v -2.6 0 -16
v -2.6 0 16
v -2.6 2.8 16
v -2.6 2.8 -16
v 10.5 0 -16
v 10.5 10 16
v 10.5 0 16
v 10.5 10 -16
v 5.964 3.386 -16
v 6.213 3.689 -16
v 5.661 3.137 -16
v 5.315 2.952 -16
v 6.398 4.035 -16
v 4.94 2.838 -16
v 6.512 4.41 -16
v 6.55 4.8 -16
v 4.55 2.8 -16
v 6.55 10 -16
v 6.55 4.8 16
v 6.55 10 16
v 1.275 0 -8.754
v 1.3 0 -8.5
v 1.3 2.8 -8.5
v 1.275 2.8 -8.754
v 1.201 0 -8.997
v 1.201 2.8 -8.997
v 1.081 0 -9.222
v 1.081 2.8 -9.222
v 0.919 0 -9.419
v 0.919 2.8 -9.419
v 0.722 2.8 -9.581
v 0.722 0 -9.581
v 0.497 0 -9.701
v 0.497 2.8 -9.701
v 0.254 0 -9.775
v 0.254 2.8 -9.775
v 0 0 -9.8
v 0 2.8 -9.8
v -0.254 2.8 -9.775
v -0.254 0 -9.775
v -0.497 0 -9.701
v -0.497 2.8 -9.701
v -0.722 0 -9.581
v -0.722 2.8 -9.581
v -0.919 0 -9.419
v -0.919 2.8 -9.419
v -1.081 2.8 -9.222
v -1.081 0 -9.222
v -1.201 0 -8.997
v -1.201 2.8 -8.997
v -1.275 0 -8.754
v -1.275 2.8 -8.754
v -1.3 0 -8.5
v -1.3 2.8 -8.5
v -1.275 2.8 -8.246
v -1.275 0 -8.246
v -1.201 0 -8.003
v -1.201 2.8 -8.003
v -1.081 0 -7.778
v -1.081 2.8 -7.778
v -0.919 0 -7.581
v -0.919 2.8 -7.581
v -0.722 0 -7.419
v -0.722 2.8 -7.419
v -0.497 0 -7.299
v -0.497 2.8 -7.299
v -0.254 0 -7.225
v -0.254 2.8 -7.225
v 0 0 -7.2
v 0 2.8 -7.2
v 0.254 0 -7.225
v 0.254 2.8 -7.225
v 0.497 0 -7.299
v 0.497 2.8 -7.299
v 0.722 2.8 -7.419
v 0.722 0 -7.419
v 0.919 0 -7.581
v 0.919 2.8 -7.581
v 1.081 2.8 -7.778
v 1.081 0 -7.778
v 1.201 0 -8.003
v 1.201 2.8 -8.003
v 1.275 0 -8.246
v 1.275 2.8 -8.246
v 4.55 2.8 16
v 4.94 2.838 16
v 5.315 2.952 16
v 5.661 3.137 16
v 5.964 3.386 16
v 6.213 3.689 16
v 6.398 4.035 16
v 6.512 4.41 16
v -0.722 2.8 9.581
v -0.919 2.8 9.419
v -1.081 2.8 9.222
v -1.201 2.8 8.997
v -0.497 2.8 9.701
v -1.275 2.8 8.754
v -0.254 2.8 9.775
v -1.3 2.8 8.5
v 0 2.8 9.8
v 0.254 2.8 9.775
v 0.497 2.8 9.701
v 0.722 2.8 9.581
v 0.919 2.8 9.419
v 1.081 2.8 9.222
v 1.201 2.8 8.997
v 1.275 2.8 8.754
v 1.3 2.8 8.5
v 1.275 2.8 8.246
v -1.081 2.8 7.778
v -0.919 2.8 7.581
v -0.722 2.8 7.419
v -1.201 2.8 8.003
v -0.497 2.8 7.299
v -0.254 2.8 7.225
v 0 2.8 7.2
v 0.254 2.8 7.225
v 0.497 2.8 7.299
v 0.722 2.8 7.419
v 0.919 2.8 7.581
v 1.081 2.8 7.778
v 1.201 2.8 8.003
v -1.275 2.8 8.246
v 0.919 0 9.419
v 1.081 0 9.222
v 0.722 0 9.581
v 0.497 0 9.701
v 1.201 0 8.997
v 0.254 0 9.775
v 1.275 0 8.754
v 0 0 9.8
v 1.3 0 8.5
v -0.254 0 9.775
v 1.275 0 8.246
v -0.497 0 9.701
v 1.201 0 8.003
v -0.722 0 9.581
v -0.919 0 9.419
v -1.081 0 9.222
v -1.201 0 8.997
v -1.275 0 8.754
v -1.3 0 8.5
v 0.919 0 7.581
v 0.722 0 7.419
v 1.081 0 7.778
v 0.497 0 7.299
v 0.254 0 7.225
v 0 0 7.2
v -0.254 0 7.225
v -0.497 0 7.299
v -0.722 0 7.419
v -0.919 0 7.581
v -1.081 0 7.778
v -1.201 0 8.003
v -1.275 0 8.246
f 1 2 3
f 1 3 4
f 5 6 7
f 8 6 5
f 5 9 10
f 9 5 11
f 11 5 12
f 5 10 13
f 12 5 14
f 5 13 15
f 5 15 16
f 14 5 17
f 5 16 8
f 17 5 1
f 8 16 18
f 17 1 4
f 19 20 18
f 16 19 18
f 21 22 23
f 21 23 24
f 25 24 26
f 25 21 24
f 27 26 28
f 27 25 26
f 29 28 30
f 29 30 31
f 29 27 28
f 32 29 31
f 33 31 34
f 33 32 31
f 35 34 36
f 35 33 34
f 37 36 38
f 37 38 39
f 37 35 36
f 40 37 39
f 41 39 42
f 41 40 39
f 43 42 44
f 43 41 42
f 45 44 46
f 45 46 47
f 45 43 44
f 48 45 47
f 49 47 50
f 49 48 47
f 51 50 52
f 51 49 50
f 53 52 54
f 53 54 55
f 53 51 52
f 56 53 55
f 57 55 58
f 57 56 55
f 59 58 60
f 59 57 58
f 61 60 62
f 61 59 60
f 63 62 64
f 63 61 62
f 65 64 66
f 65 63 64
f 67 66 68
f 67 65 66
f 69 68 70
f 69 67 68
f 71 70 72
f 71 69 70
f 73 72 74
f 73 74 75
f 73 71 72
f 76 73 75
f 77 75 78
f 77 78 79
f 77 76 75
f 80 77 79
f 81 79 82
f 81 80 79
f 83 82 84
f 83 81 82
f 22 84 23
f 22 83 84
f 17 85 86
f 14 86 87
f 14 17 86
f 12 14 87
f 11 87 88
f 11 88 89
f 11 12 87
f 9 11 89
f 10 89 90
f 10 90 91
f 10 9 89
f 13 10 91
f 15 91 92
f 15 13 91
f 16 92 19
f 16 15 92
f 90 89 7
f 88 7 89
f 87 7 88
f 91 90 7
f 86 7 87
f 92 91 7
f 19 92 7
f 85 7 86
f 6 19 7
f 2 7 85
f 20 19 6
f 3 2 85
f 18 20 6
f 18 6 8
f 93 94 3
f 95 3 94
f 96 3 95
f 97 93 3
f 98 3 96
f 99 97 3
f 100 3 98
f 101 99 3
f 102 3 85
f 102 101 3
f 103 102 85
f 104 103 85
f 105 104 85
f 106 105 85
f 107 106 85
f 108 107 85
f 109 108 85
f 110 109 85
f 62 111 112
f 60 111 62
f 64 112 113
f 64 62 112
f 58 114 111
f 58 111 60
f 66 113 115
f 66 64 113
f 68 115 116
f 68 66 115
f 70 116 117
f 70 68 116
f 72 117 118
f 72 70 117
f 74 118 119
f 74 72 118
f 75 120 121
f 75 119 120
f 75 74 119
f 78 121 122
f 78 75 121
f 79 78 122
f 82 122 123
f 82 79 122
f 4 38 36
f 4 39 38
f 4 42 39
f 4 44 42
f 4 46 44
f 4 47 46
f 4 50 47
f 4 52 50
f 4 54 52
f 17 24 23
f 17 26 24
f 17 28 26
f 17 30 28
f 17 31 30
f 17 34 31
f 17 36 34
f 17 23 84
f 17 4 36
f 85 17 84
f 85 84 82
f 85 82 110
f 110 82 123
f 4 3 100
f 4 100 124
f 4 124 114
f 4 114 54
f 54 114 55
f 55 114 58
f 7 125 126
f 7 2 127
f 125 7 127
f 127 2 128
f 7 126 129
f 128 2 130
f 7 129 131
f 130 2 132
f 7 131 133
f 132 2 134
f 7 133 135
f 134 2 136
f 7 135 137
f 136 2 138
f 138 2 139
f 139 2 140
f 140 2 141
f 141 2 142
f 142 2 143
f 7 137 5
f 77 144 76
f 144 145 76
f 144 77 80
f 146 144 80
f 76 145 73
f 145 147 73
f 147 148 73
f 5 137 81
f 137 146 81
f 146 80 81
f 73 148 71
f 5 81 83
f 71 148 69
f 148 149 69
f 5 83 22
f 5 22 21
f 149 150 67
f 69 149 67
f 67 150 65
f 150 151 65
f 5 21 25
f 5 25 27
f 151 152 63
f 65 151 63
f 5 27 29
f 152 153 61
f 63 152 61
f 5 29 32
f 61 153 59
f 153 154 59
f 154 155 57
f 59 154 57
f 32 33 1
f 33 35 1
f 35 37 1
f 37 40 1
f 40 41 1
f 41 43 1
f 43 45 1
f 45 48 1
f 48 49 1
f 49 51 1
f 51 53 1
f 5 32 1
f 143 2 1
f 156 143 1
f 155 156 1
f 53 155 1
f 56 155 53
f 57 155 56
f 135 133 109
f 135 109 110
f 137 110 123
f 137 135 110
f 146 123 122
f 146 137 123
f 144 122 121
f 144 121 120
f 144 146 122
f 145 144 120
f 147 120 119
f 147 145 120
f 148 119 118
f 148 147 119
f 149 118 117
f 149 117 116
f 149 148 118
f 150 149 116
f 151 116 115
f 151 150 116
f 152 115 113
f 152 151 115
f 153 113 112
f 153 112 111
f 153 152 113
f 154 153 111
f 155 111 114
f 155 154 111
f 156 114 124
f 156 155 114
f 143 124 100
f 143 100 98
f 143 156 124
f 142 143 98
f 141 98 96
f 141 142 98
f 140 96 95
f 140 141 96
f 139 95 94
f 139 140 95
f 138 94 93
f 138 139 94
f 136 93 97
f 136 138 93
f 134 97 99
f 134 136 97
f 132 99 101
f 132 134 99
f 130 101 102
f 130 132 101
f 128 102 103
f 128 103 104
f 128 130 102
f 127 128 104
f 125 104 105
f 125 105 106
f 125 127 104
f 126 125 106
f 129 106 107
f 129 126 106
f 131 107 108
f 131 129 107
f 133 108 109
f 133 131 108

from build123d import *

# Parameters (mm, degrees)
SKETCH1_W           = 5.2
SKETCH1_H           = 32
SKETCH1_R           = 1.3
BOSS_EXTRUDE1_DEPTH = 2.8
SKETCH2_W           = 32
SKETCH2_H           = 10
BOSS_EXTRUDE2_DEPTH = 7.9
SKETCH3_W           = 3.95
SKETCH3_H           = 32
CUT_EXTRUDE1_DEPTH  = 7.2
FILLET1_R           = 2


with BuildPart() as part:
    # Sketch1 → Boss-Extrude1 (new body)
    with BuildSketch(Plane(origin=(0, 0, 0), x_dir=(1, 0, 0), z_dir=(0, 1, 0))):
        Rectangle(SKETCH1_W, SKETCH1_H)
        with Locations((0, -8.5)):
            Circle(SKETCH1_R, mode=Mode.SUBTRACT)
        with Locations((0, 8.5)):
            Circle(SKETCH1_R, mode=Mode.SUBTRACT)
    extrude(amount=BOSS_EXTRUDE1_DEPTH)

    # Sketch2 → Boss-Extrude2 (add)
    with BuildSketch(Plane(origin=(2.6, 0, 0), x_dir=(0, 0, -1), z_dir=(1, 0, 0))):
        with Locations((0, 5)):
            Rectangle(SKETCH2_W, SKETCH2_H)
    extrude(amount=BOSS_EXTRUDE2_DEPTH)

    # Sketch3 → Cut-Extrude1 (cut)
    with BuildSketch(Plane(origin=(0, 10, 0), x_dir=(1, 0, 0), z_dir=(0, 1, 0))):
        with Locations((4.575, 0)):
            Rectangle(SKETCH3_W, SKETCH3_H)
    extrude(amount=-CUT_EXTRUDE1_DEPTH, mode=Mode.SUBTRACT)

    # Fillet1
    fillet1_edges = [part.edges().sort_by_distance(p)[0] for p in [
        (6.55, 2.8, 0),
    ]]
    fillet(fillet1_edges, radius=FILLET1_R)


solid = part.part
